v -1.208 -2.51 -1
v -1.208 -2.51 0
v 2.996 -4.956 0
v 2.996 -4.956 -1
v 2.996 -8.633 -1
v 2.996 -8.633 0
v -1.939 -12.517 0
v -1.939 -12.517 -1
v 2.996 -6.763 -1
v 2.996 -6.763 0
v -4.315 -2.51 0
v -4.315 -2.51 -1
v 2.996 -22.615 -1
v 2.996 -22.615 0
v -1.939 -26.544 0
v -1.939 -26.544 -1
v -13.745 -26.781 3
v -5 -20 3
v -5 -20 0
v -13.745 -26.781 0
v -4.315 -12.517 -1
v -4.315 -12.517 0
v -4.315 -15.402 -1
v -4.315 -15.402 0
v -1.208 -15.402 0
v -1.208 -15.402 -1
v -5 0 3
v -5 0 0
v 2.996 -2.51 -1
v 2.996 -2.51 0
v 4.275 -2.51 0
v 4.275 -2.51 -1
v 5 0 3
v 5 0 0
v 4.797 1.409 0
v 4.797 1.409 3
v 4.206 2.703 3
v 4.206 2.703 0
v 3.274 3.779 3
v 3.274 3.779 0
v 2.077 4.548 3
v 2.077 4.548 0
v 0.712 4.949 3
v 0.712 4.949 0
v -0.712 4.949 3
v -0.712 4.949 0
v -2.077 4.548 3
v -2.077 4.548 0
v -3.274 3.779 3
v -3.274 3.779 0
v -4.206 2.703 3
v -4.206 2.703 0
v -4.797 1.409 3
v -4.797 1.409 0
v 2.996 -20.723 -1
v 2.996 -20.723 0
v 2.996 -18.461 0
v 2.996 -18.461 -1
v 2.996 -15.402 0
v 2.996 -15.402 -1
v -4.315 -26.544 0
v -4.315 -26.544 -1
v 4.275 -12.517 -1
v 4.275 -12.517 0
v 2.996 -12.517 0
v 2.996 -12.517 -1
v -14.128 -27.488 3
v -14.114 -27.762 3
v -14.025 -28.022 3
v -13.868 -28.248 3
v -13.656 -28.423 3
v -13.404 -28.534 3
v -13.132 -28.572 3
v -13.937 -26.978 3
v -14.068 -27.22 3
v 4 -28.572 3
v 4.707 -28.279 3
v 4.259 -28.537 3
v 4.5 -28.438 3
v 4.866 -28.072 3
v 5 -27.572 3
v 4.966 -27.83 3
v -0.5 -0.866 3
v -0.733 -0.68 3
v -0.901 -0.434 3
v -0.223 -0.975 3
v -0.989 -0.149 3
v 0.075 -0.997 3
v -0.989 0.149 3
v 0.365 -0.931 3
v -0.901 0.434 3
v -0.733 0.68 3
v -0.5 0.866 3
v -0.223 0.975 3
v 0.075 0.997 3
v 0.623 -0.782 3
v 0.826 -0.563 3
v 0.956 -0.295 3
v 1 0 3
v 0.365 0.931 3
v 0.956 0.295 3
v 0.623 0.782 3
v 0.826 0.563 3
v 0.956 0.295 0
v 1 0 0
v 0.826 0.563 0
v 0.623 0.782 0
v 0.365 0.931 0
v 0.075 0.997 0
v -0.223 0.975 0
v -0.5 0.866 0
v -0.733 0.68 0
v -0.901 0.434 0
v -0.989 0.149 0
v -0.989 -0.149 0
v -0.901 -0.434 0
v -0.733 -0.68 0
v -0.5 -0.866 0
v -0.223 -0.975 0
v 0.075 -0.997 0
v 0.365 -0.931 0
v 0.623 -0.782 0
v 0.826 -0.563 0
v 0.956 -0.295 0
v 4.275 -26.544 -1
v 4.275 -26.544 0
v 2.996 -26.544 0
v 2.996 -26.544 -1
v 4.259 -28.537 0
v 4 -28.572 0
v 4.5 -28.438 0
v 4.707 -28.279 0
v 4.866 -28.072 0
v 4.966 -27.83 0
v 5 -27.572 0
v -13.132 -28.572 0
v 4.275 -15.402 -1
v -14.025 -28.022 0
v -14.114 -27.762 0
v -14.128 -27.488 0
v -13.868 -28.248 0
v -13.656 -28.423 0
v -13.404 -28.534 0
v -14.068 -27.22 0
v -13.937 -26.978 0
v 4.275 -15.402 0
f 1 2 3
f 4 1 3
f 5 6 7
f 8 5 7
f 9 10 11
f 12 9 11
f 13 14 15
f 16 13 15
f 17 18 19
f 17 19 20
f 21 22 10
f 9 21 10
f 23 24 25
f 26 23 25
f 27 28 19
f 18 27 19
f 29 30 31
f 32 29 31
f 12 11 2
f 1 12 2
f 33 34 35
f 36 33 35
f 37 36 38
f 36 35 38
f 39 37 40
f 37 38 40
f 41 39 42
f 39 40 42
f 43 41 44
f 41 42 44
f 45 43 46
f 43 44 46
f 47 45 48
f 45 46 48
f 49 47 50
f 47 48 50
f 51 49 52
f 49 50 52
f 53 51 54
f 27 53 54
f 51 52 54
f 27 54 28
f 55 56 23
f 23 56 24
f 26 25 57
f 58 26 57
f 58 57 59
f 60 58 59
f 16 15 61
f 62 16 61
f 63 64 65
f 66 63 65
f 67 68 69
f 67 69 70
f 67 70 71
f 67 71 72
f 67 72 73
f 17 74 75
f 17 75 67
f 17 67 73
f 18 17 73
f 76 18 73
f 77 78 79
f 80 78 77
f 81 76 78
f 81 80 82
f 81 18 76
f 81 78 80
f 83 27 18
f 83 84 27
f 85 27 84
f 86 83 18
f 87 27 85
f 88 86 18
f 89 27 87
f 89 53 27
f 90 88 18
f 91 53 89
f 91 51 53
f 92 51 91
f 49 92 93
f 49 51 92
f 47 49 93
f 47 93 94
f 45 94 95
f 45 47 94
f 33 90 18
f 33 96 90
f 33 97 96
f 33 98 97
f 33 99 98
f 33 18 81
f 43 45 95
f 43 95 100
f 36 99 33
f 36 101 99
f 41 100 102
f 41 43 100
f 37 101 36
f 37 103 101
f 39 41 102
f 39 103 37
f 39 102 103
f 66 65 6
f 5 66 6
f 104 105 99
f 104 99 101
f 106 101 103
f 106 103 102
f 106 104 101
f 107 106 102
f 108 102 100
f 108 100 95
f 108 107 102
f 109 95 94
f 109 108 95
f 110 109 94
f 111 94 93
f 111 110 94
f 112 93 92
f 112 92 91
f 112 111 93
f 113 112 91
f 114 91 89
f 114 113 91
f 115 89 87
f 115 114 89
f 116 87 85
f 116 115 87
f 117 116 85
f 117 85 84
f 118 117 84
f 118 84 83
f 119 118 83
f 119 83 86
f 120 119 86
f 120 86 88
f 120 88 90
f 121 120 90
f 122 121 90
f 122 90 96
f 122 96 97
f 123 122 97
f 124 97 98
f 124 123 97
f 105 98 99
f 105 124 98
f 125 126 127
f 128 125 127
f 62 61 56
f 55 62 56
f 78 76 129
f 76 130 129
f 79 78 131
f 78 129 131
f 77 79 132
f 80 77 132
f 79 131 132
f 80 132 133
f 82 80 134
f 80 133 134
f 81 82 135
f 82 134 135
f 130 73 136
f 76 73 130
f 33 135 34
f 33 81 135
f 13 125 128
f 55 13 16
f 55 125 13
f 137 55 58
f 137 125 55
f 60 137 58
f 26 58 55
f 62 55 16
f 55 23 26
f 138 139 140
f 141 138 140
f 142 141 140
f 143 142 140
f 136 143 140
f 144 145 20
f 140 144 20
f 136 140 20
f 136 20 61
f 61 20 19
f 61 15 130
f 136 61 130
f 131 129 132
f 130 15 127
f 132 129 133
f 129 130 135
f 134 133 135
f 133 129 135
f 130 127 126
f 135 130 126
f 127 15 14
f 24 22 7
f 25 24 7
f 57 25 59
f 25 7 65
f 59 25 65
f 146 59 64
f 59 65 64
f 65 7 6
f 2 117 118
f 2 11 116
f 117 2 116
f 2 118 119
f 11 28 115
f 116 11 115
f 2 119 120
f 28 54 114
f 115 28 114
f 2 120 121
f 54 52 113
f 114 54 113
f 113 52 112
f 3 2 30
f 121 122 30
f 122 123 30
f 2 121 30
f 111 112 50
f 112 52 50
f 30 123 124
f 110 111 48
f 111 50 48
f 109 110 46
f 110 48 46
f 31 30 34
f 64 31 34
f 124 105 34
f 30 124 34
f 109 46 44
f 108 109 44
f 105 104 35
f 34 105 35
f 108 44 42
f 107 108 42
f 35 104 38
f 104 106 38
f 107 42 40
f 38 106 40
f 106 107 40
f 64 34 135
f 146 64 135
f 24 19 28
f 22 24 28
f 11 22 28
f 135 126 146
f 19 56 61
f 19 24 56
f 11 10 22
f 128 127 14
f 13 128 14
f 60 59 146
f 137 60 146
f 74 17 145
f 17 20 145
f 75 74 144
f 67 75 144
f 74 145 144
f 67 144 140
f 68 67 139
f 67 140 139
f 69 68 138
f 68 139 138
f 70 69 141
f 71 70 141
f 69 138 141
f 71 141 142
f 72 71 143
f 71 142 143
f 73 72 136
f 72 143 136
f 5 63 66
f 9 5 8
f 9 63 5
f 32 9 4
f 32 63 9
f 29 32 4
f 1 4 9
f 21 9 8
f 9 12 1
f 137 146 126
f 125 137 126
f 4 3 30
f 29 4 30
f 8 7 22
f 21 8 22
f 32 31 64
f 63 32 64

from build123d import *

# Parameters (mm, degrees)
SKETCH_1_R      = 1
EXTRUDE_1_DEPTH = 3
EXTRUDE_2_DEPTH = 3
FILLET_2_R      = 1
FILLET_3_R      = 1
EXTRUDE_4_DEPTH = 1


with BuildPart() as part:
    # 草图1 → 凸台-拉伸1 (new body)
    with BuildSketch(Plane.XY):
        with BuildLine():
            Line((-5, 0), (-5, -20))
            Line((-5, -20), (5, -20))
            Line((5, -20), (5, 0))
            ThreePointArc((5, 0), (0, 5), (-5, 0))
        make_face()
        Circle(SKETCH_1_R, mode=Mode.SUBTRACT)
    extrude(amount=EXTRUDE_1_DEPTH)

    # 草图2 → 凸台-拉伸2 (add)
    with BuildSketch(Plane.XY.offset(3)):
        Polygon((5, -20), (-5, -20), (-16.053330201, -28.571505672), (5, -28.571505672), align=None)
    extrude(amount=-EXTRUDE_2_DEPTH)

    # 圆角2
    fillet_2_edges = [part.edges().sort_by_distance(p)[0] for p in [
        (-16.053330201, -28.571505672, 1.5),
    ]]
    fillet(fillet_2_edges, radius=FILLET_2_R)

    # 圆角3
    fillet_3_edges = [part.edges().sort_by_distance(p)[0] for p in [
        (5, -28.571505672, 1.5),
    ]]
    fillet(fillet_3_edges, radius=FILLET_3_R)

    # 草图4 → 凸台-拉伸4 (add)
    with BuildSketch(Plane(origin=(0, 0, 0), x_dir=(-1, 0, 0), z_dir=(0, 0, -1))):
        Polygon((-4.275312121, -2.510402489), (-4.275312121, -12.516814932), (-2.995953453, -12.516814932), (-2.995953453, -8.633047546), (1.938715697, -12.516814932), (4.31466751, -12.516814932), (-2.995953453, -6.763085471), (4.31466751, -2.510402489), (1.207653601, -2.510402489), (-2.995953453, -4.955695204), (-2.995953453, -2.510402489), align=None)
        Polygon((-4.275312121, -15.401899276), (-4.275312121, -26.544068904), (-2.995953453, -26.544068904), (-2.995953453, -22.614610137), (1.938715697, -26.544068904), (4.31466751, -26.544068904), (-2.995953453, -20.722648508), (4.31466751, -15.401899276), (1.207653601, -15.401899276), (-2.995953453, -18.461330084), (-2.995953453, -15.401899276), align=None)
    extrude(amount=EXTRUDE_4_DEPTH)


solid = part.part
